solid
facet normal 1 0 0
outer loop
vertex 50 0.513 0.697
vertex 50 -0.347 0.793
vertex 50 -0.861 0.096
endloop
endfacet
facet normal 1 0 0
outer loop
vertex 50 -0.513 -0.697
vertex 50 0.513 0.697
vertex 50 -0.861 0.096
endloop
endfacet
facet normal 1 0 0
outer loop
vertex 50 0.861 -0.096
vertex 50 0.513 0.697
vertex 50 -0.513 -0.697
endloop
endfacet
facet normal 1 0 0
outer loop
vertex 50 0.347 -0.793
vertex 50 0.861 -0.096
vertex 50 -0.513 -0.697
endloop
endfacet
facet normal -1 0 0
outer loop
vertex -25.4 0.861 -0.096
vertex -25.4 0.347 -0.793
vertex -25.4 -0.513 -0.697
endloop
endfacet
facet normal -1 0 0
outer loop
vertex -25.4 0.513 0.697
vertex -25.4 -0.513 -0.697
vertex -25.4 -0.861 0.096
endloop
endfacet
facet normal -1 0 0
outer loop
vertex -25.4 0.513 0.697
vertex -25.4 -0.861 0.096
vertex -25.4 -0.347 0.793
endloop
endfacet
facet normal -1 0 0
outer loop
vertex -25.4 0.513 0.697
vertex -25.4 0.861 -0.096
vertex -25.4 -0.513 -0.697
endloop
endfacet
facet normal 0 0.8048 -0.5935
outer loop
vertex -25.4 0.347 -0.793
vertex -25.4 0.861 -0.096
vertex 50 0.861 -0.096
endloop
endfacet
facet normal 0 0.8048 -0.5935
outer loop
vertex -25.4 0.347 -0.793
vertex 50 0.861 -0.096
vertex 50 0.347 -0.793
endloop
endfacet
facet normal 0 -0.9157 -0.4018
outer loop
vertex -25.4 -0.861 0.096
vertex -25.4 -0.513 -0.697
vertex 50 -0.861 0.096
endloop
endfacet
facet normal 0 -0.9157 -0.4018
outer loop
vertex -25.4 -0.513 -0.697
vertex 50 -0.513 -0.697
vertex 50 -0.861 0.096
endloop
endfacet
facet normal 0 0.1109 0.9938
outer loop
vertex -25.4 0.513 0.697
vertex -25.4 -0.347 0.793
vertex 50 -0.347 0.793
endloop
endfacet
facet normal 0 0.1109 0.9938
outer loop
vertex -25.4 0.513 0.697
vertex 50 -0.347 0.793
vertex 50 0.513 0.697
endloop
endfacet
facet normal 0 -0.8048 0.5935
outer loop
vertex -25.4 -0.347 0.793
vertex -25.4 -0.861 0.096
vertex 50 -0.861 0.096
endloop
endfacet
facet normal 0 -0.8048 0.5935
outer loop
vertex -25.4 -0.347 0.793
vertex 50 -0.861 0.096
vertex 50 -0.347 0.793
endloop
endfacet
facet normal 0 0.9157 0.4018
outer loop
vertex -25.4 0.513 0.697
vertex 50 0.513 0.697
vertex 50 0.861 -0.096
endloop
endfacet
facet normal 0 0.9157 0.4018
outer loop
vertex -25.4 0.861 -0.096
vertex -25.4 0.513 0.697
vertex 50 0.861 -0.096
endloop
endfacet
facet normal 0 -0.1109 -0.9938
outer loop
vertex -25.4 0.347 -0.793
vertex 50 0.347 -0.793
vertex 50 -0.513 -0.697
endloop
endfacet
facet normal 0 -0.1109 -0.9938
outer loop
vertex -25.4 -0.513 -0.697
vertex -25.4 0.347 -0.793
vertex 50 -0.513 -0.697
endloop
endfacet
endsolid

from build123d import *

# Parameters (mm, degrees)
BOSS_EXTRUDE1_DEPTH = 50
BOSS_EXTRUDE2_DEPTH = 25.4


with BuildPart() as part:
    # Sketch1 → Boss-Extrude1 (new body)
    with BuildSketch(Plane(origin=(0, 0, 0), x_dir=(0, 0, -1), z_dir=(1, 0, 0))):
        Polygon((-0.697410306, 0.513438277), (-0.793355745, -0.347255904), (-0.095945438, -0.860694181), (0.697410306, -0.513438277), (0.793355745, 0.347255904), (0.095945438, 0.860694181), align=None)
    extrude(amount=BOSS_EXTRUDE1_DEPTH)

    # Sketch2 → Boss-Extrude2 (add)
    with BuildSketch(Plane.ZY):
        Polygon((-0.793355745, 0.347255904), (-0.697410306, -0.513438277), (0.095945438, -0.860694181), (0.793355745, -0.347255904), (0.697410306, 0.513438277), (-0.095945438, 0.860694181), align=None)
    extrude(amount=BOSS_EXTRUDE2_DEPTH)


solid = part.part
